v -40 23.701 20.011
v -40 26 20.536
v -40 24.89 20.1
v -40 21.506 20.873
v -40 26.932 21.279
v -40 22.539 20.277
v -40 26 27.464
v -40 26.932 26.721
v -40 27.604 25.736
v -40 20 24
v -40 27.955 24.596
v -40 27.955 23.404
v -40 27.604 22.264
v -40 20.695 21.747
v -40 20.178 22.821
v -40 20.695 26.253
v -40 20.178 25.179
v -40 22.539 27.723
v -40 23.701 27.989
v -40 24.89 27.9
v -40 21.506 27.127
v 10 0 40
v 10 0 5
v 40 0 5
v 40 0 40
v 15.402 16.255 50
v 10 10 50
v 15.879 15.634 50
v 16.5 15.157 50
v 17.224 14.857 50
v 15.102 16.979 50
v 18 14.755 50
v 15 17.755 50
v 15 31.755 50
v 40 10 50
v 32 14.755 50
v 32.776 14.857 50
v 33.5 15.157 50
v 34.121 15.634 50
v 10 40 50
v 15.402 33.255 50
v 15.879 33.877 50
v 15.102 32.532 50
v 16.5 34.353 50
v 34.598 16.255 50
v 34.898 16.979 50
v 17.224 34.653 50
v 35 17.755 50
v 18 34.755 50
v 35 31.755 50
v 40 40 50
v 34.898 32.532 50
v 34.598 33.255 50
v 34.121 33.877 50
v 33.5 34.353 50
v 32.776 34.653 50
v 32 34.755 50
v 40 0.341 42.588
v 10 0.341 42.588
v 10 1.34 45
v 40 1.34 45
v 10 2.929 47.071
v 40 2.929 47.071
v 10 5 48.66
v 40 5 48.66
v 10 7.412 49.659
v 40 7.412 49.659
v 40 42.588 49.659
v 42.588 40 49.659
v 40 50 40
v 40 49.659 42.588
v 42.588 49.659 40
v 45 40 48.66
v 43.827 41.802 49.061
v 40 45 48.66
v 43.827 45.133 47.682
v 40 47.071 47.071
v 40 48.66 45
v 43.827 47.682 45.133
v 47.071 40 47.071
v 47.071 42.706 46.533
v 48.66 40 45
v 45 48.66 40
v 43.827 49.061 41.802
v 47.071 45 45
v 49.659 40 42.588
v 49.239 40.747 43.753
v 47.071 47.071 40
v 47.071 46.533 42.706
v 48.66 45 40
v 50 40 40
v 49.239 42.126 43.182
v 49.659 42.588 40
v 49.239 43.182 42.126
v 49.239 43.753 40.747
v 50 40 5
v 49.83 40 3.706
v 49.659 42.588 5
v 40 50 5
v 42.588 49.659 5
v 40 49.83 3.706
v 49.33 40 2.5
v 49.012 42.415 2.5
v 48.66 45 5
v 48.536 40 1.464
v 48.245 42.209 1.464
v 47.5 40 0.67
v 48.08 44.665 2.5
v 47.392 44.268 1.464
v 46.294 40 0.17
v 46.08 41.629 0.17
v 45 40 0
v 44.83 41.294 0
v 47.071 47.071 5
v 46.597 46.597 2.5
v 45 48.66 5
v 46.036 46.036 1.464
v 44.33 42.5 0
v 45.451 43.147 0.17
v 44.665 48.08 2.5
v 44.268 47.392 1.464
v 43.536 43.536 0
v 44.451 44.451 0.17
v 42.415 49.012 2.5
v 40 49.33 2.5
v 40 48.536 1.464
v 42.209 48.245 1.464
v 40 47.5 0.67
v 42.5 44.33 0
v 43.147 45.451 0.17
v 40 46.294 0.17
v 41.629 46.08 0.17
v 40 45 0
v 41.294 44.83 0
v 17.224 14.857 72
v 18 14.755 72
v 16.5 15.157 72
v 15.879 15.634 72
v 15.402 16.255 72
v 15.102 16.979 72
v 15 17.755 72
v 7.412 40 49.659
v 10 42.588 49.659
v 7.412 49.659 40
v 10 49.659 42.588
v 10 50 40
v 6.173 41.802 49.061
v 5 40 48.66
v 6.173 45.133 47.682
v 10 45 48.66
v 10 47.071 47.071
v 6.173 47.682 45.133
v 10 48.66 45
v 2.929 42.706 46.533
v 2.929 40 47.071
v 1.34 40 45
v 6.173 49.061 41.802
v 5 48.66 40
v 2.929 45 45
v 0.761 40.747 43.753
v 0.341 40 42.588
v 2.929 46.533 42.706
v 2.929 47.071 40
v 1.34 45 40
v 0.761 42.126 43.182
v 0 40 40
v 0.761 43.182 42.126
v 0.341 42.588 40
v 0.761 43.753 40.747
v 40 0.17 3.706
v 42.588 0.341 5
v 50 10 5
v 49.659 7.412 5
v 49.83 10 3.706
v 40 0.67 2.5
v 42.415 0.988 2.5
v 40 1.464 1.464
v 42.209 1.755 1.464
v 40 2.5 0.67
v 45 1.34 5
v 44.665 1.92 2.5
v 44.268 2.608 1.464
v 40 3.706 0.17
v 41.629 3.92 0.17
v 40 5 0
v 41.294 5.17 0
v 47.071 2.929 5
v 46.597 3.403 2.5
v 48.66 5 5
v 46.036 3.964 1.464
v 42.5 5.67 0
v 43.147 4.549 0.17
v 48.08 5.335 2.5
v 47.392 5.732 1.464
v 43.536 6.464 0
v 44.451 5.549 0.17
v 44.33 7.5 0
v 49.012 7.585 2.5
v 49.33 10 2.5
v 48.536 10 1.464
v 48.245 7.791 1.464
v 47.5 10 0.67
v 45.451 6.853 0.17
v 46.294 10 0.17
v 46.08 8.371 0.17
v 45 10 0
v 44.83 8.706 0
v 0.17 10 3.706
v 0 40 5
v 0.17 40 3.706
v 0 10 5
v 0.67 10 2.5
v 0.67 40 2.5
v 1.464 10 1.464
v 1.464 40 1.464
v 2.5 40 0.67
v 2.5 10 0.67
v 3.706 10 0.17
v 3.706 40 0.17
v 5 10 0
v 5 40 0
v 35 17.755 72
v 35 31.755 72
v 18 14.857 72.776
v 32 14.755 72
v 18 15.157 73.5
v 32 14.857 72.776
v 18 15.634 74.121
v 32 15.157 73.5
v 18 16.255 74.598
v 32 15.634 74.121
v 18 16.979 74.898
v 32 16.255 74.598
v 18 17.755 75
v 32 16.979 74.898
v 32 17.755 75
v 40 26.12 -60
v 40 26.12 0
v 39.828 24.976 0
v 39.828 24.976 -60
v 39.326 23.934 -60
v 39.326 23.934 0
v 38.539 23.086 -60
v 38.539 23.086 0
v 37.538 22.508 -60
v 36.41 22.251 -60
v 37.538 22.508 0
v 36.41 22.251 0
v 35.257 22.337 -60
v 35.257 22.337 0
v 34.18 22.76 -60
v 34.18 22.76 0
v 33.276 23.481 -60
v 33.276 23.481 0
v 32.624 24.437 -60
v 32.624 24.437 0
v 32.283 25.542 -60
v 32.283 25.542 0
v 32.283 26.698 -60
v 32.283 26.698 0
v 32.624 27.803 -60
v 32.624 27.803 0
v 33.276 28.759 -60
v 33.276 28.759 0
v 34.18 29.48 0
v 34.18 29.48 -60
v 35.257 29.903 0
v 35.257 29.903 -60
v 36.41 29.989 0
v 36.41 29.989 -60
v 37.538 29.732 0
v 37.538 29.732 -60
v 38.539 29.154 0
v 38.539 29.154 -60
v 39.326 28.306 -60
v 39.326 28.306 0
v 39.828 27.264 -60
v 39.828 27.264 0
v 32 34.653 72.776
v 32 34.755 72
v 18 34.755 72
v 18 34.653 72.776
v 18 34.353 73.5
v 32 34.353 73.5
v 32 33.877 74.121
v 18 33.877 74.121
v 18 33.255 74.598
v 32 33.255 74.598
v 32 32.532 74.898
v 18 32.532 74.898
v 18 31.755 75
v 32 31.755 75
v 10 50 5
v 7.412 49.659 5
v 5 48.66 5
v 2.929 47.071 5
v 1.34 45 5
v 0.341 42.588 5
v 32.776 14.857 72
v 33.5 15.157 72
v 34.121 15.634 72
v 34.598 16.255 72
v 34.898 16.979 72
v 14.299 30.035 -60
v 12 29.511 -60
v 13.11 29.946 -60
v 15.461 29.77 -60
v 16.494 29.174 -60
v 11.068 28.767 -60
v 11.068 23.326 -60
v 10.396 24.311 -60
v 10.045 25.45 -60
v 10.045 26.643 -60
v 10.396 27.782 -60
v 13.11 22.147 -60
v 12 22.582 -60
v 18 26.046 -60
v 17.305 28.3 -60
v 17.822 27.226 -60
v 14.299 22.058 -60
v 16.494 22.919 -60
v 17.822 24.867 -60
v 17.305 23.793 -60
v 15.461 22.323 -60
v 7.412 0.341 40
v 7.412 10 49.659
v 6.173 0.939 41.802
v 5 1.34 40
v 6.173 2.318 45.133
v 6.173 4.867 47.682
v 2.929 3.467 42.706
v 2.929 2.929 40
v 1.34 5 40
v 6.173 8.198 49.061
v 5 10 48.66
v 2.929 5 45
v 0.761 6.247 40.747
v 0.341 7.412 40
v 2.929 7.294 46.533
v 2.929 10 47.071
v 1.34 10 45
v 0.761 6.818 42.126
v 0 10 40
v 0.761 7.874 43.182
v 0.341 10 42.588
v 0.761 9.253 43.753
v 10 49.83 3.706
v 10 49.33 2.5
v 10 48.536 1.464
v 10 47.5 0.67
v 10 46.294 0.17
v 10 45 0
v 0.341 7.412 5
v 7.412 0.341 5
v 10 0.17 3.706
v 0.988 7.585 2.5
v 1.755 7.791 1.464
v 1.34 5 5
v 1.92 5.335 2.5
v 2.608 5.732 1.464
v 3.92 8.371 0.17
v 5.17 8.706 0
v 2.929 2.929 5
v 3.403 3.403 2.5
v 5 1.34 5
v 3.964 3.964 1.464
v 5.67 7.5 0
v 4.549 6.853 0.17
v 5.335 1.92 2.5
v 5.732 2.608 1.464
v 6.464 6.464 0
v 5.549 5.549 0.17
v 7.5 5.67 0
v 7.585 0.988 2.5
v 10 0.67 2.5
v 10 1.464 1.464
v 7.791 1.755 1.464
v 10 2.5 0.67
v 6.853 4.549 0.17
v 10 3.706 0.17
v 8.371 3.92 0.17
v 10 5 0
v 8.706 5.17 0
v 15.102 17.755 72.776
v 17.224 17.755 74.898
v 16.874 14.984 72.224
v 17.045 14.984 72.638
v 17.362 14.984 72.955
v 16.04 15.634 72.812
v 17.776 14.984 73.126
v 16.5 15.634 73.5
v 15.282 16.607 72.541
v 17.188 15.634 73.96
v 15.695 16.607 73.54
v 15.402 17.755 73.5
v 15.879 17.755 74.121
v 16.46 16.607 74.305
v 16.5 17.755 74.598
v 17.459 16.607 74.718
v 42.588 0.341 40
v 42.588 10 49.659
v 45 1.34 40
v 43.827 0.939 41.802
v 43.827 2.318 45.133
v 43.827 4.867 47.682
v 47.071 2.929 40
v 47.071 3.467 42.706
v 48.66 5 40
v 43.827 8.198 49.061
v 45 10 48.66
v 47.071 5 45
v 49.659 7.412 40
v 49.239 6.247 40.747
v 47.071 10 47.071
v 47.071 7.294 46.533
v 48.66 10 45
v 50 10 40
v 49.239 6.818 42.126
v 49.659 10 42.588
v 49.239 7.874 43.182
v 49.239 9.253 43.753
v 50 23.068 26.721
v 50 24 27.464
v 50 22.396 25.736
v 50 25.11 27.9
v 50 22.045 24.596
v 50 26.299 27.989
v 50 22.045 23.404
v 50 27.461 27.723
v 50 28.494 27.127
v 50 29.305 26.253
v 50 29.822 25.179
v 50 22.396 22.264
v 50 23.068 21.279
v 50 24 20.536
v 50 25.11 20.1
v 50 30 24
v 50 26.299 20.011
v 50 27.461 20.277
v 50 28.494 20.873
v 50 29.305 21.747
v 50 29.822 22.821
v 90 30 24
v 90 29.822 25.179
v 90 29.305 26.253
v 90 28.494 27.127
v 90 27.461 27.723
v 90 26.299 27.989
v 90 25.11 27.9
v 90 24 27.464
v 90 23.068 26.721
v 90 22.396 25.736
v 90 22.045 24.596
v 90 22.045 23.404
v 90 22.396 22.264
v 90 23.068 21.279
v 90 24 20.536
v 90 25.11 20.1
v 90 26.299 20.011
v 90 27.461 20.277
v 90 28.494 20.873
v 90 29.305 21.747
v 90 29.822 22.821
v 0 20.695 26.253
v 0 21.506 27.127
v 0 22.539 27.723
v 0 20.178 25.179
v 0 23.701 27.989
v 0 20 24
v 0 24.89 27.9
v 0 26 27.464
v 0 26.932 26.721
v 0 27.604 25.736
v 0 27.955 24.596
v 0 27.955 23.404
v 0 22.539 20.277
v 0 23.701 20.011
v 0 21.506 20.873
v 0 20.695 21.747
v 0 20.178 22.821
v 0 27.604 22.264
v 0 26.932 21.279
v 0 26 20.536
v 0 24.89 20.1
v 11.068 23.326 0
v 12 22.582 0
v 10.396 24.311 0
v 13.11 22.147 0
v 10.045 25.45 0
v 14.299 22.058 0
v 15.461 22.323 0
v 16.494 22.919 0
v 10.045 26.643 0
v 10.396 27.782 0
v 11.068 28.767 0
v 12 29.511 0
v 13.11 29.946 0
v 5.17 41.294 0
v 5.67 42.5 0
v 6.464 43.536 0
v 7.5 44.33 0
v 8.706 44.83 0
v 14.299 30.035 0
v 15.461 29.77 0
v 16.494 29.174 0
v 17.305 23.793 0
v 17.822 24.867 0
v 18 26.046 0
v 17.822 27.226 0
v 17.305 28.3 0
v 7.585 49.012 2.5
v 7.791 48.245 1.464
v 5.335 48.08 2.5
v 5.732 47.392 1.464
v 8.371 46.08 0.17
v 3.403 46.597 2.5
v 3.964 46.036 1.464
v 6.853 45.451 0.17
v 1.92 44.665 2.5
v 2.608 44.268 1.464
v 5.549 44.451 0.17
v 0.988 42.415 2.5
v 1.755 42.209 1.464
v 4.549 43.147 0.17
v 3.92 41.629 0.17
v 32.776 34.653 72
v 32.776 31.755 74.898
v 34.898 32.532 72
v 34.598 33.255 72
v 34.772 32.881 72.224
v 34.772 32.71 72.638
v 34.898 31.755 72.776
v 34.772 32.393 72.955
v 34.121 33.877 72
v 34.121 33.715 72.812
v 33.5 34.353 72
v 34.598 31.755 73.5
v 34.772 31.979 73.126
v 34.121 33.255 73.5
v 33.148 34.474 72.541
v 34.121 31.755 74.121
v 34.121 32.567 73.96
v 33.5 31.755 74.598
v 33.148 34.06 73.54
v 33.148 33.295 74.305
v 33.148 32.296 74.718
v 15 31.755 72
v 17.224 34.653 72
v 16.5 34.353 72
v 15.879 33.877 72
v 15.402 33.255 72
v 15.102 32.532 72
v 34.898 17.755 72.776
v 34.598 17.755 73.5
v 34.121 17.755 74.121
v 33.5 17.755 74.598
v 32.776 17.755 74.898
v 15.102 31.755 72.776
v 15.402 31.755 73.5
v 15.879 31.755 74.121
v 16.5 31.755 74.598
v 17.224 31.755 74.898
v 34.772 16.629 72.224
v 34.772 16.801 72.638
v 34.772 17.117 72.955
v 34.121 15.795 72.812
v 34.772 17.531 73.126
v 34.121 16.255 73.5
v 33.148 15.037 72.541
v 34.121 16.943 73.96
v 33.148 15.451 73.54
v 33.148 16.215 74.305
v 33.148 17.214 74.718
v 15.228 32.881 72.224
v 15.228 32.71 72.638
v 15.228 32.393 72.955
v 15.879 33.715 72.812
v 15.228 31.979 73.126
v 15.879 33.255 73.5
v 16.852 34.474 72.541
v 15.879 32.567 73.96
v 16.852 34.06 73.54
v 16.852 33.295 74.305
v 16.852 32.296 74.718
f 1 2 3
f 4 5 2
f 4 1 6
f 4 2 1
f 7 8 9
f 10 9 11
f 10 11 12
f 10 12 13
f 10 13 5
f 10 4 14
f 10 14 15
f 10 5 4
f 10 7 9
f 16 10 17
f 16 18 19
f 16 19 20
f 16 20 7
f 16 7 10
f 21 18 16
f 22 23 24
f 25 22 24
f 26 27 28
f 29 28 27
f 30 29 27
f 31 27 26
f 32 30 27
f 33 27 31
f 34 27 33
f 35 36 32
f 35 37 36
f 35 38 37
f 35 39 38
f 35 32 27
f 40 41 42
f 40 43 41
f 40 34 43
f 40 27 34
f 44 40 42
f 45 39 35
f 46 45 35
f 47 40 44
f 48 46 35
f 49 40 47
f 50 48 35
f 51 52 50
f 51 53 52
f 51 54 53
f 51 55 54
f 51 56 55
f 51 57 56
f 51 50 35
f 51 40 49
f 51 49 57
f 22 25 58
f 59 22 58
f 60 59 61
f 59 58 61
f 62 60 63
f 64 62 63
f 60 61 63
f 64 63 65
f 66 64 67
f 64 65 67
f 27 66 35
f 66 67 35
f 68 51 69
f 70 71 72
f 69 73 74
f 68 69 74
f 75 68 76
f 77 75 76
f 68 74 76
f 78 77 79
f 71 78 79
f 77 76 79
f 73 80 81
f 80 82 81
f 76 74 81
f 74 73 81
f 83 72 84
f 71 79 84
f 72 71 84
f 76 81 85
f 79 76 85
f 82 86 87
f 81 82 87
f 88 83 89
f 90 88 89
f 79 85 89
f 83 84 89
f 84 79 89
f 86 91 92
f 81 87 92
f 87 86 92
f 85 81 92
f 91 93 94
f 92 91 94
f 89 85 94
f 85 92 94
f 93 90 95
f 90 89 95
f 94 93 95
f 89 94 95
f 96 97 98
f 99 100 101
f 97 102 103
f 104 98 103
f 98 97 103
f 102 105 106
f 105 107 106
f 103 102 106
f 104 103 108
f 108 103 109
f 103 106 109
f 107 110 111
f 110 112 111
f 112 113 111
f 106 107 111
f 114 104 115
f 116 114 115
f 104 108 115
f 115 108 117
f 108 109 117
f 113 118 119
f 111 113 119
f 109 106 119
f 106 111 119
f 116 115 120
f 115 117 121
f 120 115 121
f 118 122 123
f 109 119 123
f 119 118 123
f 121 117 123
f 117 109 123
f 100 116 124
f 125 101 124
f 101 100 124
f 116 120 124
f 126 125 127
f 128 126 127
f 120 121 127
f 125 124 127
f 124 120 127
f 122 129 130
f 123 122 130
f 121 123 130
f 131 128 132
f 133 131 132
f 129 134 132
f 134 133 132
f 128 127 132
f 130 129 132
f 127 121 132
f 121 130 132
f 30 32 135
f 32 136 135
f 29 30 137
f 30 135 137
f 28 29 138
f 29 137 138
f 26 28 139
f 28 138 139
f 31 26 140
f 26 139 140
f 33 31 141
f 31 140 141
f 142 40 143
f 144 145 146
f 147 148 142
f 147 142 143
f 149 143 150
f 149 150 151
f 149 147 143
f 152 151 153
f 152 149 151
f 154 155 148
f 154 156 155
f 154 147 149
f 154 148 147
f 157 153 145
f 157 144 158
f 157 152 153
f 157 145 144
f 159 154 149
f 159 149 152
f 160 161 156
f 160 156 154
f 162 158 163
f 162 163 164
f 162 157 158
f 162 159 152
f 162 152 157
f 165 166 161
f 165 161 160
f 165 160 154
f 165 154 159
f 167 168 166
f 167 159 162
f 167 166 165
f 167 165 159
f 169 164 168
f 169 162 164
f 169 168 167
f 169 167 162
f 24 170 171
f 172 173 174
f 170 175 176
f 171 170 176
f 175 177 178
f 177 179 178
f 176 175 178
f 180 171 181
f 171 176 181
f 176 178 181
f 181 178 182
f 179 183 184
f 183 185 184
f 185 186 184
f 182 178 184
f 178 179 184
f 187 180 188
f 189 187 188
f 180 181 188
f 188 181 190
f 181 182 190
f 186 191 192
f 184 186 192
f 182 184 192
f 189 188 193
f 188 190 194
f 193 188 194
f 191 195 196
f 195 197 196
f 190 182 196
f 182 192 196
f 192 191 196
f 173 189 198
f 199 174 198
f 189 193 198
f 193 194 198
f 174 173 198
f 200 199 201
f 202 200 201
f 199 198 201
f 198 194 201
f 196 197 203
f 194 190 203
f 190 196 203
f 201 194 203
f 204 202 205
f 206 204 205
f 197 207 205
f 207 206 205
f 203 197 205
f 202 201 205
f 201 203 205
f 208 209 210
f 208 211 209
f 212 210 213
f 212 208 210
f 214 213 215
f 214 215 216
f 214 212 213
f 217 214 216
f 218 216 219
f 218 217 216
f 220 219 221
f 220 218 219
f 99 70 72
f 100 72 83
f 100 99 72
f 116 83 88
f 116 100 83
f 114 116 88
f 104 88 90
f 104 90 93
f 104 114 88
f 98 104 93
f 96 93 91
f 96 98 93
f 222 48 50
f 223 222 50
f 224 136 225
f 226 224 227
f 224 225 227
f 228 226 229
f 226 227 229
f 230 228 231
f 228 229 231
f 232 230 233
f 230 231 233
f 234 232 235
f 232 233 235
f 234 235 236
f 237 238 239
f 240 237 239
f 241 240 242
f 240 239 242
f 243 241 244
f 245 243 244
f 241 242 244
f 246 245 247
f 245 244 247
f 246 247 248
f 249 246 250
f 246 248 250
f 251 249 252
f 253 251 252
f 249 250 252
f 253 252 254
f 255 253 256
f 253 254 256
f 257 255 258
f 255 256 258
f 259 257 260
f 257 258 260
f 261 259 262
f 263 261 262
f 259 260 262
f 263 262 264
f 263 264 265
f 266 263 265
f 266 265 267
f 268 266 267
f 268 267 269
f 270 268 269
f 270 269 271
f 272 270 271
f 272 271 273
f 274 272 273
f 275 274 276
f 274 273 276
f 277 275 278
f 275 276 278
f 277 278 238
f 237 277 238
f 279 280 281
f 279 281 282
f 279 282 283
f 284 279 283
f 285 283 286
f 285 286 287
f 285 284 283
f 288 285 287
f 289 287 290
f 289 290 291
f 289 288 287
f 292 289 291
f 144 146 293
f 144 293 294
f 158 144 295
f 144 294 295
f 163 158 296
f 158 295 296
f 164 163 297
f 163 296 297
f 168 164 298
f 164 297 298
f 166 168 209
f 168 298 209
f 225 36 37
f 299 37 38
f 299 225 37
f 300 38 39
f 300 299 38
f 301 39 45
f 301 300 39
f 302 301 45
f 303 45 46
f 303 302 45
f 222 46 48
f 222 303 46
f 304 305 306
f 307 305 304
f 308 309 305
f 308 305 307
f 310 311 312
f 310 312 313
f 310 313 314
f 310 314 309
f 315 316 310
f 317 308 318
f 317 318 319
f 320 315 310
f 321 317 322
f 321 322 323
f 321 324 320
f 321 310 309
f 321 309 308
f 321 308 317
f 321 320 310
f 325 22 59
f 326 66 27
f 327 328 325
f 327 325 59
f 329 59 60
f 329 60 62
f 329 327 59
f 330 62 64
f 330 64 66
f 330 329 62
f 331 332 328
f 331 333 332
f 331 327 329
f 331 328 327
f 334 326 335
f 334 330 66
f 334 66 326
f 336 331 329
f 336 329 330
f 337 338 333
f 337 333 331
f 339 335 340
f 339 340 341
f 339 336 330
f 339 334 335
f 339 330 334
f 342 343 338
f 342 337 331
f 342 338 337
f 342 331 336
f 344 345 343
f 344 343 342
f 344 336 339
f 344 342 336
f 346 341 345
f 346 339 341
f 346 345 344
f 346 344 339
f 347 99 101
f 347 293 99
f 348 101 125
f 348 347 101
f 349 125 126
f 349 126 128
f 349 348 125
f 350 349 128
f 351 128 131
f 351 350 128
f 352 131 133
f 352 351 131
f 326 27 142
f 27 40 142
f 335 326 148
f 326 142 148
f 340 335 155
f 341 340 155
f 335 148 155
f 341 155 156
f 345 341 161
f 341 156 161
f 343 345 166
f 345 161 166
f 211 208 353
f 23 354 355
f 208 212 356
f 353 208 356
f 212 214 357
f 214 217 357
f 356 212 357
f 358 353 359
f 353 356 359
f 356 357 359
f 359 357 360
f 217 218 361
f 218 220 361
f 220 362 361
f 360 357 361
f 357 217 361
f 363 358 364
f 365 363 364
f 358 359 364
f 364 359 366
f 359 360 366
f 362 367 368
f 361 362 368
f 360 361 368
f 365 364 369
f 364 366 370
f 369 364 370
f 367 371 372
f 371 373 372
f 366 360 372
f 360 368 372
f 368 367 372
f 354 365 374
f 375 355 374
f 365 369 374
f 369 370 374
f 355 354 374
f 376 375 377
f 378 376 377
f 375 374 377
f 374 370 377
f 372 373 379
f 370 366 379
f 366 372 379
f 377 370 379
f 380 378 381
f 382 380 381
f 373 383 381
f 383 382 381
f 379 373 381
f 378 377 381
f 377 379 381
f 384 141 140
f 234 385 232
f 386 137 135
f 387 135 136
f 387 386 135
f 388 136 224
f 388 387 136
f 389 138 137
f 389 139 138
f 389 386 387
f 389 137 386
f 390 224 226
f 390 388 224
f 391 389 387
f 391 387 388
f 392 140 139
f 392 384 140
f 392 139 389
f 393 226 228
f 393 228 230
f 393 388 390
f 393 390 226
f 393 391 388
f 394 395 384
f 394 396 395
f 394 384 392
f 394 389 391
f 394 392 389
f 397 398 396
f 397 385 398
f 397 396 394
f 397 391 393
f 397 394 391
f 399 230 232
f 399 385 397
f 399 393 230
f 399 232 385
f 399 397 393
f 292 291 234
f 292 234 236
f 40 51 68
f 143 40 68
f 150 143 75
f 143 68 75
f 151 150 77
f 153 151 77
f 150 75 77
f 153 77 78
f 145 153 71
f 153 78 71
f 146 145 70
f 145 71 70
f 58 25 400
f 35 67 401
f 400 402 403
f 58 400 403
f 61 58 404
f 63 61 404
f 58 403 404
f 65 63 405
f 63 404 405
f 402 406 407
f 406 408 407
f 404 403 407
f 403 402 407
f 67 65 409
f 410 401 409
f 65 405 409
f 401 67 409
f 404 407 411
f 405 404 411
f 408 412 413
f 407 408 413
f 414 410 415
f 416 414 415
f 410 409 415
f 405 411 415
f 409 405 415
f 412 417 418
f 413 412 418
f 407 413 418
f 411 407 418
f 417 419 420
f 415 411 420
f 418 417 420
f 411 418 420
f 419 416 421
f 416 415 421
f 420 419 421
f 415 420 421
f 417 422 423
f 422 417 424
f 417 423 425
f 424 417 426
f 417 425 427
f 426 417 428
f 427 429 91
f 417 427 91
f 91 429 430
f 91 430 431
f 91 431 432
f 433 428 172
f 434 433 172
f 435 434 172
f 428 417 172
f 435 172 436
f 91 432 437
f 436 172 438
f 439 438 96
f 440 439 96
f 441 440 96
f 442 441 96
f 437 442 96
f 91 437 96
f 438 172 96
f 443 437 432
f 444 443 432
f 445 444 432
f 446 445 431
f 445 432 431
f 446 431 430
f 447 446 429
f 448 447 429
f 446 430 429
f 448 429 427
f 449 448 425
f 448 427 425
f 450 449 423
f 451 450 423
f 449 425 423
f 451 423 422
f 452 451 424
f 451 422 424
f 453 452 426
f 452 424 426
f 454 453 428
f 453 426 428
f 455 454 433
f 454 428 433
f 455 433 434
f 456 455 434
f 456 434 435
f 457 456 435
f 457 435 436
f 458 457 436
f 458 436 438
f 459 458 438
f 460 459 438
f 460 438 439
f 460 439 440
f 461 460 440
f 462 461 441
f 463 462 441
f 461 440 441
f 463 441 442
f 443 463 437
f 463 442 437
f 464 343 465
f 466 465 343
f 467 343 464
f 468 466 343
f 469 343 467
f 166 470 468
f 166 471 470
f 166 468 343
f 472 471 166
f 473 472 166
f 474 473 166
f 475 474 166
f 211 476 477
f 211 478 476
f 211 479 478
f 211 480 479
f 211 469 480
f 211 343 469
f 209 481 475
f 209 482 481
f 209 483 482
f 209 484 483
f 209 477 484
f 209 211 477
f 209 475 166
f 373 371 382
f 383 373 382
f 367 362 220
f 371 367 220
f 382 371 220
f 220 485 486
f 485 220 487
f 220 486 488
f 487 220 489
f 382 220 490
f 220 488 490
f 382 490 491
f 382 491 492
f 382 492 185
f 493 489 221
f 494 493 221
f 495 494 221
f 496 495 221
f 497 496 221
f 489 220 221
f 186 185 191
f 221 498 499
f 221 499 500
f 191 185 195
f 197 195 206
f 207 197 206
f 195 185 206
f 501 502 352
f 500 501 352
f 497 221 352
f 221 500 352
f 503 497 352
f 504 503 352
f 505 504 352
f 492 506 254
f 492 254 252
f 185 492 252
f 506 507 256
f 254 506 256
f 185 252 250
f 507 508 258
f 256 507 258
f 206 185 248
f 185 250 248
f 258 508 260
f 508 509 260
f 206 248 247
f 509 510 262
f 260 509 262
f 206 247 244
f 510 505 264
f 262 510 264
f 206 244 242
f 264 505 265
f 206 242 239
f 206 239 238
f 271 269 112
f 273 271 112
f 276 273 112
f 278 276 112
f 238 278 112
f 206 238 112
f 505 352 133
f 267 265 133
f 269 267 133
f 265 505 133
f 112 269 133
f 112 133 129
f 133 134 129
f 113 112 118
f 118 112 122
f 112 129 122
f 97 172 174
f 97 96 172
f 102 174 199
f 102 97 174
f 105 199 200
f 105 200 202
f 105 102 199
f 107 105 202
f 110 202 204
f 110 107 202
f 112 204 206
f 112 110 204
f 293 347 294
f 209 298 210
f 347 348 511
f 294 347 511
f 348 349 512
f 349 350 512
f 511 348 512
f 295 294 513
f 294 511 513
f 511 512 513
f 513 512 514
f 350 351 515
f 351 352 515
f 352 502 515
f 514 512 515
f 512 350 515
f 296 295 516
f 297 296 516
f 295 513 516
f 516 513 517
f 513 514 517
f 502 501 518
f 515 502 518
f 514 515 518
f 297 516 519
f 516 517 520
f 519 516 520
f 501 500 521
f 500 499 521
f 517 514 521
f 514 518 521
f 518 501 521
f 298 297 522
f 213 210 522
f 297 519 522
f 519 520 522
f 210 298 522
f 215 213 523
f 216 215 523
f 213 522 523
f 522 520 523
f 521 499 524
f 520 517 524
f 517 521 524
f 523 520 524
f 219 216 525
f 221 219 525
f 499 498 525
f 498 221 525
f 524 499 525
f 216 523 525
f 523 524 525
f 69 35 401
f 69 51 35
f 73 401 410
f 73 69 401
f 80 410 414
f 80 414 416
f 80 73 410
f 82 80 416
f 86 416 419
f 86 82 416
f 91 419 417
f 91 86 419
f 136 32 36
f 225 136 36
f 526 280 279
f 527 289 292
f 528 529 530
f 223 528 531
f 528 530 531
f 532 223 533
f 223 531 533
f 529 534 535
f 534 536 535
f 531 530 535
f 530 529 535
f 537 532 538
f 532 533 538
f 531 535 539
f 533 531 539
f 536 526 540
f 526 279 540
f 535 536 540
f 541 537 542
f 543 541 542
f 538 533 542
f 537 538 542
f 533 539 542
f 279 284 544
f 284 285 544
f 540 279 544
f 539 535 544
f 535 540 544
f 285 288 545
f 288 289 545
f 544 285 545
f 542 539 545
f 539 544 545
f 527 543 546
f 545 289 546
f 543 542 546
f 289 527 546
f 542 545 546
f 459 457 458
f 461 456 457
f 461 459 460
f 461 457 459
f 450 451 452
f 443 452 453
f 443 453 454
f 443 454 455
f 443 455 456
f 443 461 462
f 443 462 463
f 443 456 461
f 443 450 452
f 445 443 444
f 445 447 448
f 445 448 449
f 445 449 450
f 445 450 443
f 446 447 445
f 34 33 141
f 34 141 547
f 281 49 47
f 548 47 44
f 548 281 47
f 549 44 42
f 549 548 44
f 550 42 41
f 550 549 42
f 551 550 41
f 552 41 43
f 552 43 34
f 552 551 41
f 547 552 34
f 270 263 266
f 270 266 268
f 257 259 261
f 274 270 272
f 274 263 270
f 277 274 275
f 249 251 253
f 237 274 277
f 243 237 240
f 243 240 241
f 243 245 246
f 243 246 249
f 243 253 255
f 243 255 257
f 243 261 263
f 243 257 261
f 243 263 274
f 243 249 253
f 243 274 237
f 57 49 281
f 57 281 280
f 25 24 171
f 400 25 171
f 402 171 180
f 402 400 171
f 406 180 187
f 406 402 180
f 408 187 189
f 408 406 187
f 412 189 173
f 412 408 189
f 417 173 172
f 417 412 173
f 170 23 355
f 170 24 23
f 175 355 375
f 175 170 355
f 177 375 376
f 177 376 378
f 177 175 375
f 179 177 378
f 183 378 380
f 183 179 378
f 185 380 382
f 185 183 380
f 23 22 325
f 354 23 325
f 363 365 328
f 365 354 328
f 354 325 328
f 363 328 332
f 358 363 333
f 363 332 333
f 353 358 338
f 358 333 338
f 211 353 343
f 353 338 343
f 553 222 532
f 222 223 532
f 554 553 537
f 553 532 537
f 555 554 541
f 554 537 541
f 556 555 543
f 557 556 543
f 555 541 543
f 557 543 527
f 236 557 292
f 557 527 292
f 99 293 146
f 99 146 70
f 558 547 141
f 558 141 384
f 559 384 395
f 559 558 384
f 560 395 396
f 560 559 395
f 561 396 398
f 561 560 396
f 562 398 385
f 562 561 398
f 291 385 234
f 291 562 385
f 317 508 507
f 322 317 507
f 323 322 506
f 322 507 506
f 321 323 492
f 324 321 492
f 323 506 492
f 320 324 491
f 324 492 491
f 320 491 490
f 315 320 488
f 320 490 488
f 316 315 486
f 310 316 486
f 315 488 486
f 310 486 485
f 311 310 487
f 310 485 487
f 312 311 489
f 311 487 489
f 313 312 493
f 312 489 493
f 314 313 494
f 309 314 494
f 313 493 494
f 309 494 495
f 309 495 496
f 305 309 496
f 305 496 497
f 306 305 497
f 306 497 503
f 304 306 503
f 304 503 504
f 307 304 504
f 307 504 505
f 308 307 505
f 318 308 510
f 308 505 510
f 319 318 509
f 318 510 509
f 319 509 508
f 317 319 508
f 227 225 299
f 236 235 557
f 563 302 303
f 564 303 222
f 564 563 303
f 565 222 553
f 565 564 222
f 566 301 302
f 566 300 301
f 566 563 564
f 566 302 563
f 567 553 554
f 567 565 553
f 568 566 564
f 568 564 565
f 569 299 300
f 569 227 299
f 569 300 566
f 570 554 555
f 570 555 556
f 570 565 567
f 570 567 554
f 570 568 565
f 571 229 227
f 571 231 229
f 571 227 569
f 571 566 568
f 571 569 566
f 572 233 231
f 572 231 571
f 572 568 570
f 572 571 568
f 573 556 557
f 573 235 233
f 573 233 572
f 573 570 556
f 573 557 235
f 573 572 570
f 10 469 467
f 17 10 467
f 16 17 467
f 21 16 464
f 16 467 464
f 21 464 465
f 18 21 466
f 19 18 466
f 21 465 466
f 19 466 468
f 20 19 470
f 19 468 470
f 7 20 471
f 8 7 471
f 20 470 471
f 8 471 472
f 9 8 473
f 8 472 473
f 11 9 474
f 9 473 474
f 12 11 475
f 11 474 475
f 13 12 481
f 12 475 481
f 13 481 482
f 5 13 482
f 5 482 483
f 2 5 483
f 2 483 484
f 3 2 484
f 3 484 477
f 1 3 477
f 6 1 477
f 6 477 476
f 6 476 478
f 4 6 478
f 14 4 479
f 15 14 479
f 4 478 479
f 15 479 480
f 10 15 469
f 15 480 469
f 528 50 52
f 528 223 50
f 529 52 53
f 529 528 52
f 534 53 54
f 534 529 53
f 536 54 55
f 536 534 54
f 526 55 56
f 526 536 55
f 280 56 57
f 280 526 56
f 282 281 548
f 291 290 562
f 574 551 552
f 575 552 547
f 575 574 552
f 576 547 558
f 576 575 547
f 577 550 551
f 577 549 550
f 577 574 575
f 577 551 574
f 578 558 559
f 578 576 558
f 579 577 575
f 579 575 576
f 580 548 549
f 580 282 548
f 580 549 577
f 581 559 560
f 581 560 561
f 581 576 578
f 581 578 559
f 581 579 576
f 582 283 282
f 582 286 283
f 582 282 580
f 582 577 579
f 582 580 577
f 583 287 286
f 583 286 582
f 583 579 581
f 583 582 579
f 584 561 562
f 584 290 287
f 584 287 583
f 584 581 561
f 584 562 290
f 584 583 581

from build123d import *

# Parameters (mm, degrees)
F0_W      = 50
F0_H      = 50
F1_DEPTH  = 50
F2_W      = 20
F2_H      = 20
F3_DEPTH  = 25
F4_R      = 4
F5_DEPTH  = 40
F6_R      = 4
F7_DEPTH  = 40
F8_R      = 4
F10_DEPTH = 60
F9_R      = 3.879999
F11_DEPTH = 60
F12_R     = 10
F13_R     = 10
F14_R     = 10
F15_R     = 10
F16_R     = 3
F17_R     = 5


with BuildPart() as f1:
    # F0 (on Top) → F1 (new body)
    with BuildSketch(Plane.XY):
        with Locations((25, 25)):
            Rectangle(F0_W, F0_H)
    extrude(amount=F1_DEPTH)

    # F2 (on face) → F3 (join)
    with BuildSketch(Plane.XY.offset(50)):
        with Locations((25, 24.755215)):
            Rectangle(F2_W, F2_H)
    extrude(amount=F3_DEPTH)

    # F4 (on face) → F5 (join)
    with BuildSketch(Plane.YZ.offset(50)):
        with Locations((26, 24)):
            Circle(F4_R)
    extrude(amount=F5_DEPTH)

    # F6 (on face) → F7 (join)
    with BuildSketch(Plane(origin=(0, 0, 0), x_dir=(0, -1, 0), z_dir=(-1, 0, 0))):
        with Locations((-24, 24)):
            Circle(F6_R)
    extrude(amount=F7_DEPTH)

    # F8 (on face) → F10 (join)
    with BuildSketch(Plane(origin=(0, 0, 0), x_dir=(1, 0, 0), z_dir=(0, 0, -1))):
        with Locations((14, -26.046494)):
            Circle(F8_R)
    extrude(amount=F10_DEPTH)

    # F9 (on face) → F11 (join)
    with BuildSketch(Plane(origin=(0, 0, 0), x_dir=(1, 0, 0), z_dir=(0, 0, -1))):
        with Locations((36.120001, -26.120001)):
            Circle(F9_R)
    extrude(amount=F11_DEPTH)

    # F12
    f12_edges = [f1.edges().sort_by_distance(p)[0] for p in [
        (25, 0, 50),
    ]]
    fillet(f12_edges, radius=F12_R)

    # F13
    f13_edges = [f1.edges().sort_by_distance(p)[0] for p in [
        (25, 50, 50),
    ]]
    fillet(f13_edges, radius=F13_R)

    # F14
    f14_edges = [f1.edges().sort_by_distance(p)[0] for p in [
        (50, 25, 50),
    ]]
    fillet(f14_edges, radius=F14_R)

    # F15
    f15_edges = [f1.edges().sort_by_distance(p)[0] for p in [
        (0, 25, 50),
    ]]
    fillet(f15_edges, radius=F15_R)

    # F16
    f16_edges = [f1.edges().sort_by_distance(p)[0] for p in [
        (25, 34.755215, 75),
        (15, 34.755215, 62.5),
        (35, 34.755215, 62.5),
        (15, 24.755215, 75),
        (15, 14.755215, 62.5),
        (25, 14.755215, 75),
        (35, 14.755215, 62.5),
        (35, 24.755215, 75),
    ]]
    fillet(f16_edges, radius=F16_R)

    # F17
    f17_edges = [f1.edges().sort_by_distance(p)[0] for p in [
        (25, 0, 0),
    ]]
    fillet(f17_edges, radius=F17_R)


solid = f1.part
